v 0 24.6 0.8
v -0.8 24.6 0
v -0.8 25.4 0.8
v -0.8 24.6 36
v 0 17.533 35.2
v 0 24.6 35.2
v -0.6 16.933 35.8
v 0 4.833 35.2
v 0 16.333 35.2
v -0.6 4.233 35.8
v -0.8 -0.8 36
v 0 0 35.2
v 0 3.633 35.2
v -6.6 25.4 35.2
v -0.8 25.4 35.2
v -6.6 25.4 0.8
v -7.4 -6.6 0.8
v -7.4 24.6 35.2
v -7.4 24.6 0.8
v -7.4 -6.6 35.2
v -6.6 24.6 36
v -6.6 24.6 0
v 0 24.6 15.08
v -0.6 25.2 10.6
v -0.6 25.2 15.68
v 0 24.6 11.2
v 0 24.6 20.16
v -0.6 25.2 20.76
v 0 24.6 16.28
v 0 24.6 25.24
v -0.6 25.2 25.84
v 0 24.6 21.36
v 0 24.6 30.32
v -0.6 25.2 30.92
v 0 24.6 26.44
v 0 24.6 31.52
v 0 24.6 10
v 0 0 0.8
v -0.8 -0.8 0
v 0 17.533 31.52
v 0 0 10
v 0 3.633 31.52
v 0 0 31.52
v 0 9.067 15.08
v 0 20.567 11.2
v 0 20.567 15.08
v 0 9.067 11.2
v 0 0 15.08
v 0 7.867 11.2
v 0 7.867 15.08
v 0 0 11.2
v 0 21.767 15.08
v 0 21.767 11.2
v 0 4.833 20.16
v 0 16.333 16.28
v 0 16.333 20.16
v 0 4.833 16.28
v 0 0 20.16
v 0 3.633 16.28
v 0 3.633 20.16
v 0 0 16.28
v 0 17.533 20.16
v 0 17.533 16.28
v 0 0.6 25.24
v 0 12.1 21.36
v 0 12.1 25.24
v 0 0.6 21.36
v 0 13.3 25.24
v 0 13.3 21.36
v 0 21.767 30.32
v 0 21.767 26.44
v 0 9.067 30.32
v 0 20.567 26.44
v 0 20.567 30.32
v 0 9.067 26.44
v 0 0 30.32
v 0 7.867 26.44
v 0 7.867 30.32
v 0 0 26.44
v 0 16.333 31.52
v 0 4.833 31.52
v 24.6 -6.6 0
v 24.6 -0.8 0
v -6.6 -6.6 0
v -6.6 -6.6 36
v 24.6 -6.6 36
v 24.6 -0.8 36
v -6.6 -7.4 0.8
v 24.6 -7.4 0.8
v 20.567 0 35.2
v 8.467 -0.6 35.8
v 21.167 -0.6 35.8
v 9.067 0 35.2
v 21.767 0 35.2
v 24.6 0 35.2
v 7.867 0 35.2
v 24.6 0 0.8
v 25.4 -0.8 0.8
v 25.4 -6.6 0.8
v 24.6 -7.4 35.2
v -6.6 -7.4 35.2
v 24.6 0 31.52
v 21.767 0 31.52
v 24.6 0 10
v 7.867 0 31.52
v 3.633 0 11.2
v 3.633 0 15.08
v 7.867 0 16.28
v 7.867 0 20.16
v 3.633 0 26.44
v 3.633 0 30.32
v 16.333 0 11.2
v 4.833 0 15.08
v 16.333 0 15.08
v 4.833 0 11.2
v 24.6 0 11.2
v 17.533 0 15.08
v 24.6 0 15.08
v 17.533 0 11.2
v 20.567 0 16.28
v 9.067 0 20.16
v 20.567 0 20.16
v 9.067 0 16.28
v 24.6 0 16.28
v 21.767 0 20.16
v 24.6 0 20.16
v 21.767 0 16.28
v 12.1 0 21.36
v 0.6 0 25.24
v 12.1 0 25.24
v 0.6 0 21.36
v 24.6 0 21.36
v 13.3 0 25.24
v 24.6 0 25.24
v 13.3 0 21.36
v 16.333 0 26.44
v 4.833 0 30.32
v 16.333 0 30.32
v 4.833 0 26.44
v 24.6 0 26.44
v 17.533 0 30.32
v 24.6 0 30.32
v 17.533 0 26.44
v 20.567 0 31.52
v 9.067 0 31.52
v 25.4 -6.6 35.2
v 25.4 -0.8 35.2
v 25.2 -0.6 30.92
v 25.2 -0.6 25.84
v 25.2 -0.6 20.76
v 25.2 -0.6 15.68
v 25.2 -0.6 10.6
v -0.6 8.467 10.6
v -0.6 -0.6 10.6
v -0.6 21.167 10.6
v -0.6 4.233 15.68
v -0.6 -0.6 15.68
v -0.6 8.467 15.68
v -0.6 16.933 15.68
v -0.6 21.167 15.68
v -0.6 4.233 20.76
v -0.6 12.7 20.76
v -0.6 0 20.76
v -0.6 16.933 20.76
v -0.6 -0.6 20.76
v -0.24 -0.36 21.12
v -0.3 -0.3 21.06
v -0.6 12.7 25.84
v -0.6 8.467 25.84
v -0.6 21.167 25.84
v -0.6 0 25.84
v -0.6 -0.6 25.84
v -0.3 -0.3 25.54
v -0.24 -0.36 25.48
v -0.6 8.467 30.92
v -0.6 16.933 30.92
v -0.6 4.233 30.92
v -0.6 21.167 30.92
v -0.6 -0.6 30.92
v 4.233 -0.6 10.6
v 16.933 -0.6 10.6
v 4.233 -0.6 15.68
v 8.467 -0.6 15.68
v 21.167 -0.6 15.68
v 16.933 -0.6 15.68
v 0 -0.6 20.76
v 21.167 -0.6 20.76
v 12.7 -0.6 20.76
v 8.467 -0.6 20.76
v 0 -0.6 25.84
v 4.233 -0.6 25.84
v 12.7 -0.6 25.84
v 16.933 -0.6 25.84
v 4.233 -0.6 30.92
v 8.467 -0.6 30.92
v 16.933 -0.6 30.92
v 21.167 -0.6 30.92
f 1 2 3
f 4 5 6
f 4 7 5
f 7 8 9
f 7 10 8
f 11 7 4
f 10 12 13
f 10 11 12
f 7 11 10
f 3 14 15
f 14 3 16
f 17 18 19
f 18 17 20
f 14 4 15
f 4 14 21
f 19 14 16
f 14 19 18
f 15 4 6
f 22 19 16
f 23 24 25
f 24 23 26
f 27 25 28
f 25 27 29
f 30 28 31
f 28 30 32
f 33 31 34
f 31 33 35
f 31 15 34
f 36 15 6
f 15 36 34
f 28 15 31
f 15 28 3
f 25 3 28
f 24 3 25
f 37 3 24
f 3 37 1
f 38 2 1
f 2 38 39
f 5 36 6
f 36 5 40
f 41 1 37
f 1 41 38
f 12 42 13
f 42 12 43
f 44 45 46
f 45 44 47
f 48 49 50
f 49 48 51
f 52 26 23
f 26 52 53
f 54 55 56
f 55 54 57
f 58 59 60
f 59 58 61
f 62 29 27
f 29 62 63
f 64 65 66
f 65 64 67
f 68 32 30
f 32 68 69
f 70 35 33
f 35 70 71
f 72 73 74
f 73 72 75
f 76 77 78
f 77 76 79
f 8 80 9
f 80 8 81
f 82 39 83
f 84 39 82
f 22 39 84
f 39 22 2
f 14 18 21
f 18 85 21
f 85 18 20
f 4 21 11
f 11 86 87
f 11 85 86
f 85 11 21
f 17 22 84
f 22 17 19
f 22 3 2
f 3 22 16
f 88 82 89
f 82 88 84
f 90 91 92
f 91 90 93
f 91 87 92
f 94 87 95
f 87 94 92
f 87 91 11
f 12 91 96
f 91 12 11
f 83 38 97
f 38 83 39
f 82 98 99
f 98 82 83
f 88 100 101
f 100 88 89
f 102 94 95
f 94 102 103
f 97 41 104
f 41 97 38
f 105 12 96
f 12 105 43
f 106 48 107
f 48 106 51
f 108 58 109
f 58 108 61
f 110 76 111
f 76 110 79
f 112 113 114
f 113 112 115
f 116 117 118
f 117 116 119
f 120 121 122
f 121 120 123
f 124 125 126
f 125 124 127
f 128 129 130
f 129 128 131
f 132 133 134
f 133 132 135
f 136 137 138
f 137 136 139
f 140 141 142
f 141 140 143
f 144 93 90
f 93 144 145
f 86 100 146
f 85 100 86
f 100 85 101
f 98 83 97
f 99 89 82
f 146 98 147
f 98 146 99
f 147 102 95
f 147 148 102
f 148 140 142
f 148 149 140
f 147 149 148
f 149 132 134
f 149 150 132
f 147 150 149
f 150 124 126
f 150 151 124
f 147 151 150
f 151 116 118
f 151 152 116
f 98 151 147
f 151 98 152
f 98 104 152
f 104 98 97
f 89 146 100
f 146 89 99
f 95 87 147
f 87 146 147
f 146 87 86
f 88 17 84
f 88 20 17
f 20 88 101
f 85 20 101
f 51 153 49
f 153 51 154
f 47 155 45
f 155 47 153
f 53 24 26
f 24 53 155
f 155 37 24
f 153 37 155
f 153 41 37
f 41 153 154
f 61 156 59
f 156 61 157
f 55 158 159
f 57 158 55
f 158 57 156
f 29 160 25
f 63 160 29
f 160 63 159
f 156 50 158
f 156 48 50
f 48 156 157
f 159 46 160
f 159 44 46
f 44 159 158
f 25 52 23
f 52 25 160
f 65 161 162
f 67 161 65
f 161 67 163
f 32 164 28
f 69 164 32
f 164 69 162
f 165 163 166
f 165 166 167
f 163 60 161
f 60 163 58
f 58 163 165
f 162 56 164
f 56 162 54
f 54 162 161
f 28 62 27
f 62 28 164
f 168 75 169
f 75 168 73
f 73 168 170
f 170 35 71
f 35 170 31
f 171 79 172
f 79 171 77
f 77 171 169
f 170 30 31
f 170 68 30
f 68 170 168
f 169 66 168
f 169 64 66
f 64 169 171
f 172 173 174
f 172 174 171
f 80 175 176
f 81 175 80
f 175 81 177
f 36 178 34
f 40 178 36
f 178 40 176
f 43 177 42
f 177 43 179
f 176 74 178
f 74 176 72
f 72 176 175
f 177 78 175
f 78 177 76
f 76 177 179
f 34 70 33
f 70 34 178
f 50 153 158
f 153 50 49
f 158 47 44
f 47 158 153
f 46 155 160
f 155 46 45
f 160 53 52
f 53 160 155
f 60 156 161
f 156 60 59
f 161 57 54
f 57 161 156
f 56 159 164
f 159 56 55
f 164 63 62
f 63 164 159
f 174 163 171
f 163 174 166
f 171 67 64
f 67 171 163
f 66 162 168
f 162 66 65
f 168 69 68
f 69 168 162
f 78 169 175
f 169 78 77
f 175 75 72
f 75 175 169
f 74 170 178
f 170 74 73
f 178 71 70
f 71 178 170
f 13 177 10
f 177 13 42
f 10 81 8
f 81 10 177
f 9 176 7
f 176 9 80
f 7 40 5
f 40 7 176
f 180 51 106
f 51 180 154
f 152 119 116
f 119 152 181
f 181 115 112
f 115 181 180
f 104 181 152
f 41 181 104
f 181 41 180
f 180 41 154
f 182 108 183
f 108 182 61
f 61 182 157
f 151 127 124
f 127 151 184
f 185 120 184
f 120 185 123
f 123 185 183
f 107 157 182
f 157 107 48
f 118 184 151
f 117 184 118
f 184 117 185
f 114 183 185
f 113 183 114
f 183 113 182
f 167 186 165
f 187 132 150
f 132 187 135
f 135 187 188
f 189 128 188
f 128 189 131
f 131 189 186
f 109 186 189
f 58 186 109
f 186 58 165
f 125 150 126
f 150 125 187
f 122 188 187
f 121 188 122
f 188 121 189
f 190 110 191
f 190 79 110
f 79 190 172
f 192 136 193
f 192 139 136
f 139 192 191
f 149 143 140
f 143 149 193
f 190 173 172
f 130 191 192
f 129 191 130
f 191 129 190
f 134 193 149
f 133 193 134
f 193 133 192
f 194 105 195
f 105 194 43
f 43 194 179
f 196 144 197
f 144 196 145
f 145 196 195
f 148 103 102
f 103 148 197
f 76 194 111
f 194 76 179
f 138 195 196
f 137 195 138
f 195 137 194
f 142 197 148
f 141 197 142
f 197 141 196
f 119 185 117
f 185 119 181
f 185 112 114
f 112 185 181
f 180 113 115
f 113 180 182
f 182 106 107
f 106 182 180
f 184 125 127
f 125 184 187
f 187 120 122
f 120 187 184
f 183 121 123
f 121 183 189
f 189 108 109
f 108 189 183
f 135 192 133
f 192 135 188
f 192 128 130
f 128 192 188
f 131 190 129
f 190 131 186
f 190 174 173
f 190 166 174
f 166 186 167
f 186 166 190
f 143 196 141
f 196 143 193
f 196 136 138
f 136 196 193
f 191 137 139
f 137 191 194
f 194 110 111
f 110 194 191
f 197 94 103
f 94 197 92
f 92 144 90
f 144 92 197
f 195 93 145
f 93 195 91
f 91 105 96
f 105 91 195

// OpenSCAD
// file: wall_01_solid.scad
include <libs.scad>;

//wall
*linear_wall(4);
*round_wall(2);
corner_wall(1);

module linear_wall_base(size)
{
    translate([-wall_width/2,size*basis/2,wall_height/2])hull()
    {
        cube([wall_width-bevel*2,size*basis,wall_height-bevel*2],center=true);
        cube([wall_width-bevel*2,size*basis-bevel*2,wall_height],center=true);
        cube([wall_width,size*basis-bevel*2,wall_height-bevel*2],center=true);
    }
}

module round_wall_base(size)
{
    difference()
    {
        hull()
        {
            translate([0,0,bevel])cylinder(r=size*basis+wall_width,h=wall_height-bevel*2);
            cylinder(r=size*basis+wall_width-bevel,h=wall_height);
        }
        cylinder(r=size*basis,h=wall_height);
        translate([0,0,-ep])cylinder(r1=size*basis+bevel,r2=size*basis,h=bevel);
        translate([0,0,wall_height-bevel+ep])cylinder(r2=size*basis+bevel,r1=size*basis,h=bevel);
    }
}

module linear_brick_grids(size)
{
    //one for each wall level, horizontal
    brick_h=(wall_height-floor_thick)/wall_layers;
    for (ii=[0:wall_layers-1])
    {
        translate([0,size*basis/2,floor_thick+ii*brick_h])rotate([0,45,0])cube([wall_groove*sqrt(2),size*basis*2,wall_groove*sqrt(2)],center=true);
    }
    //vertical
    //one above floor is off by half, then even, then off
    for (ii=[1:1:wall_layers])
    {
        for(jj=[0:.5:size+1])
        {
            translate([0,jj*basis-(ii%6)*basis/6,floor_thick+ii*brick_h-brick_h/2])rotate([0,0,45])cube([wall_groove*sqrt(2),wall_groove*sqrt(2),brick_h],center=true);
        }
    }
}

module round_brick_grids(size)
{
    brick_h=(wall_height-floor_thick)/wall_layers;
    //horizontal
    for (ii=[0:wall_layers-1])
    {
        translate([0,0,floor_thick+ii*brick_h])hull()
        {
            cylinder(r=basis*size+wall_groove,h=ep,center=true);
            cylinder(r=basis*size,h=wall_groove*2,center=true);
        }
    }
    //vertical
    //vertical should be shifted each layer
    for (ii=[1:1:wall_layers])
    {
        for(jj=[0:30/size:120])
        {
            rotate([0,0,jj+(ii%6)*(10/size)])translate([basis*size,0,floor_thick+ii*brick_h-brick_h/2])rotate([0,0,45])cube([wall_groove*sqrt(2),wall_groove*sqrt(2),brick_h],center=true);
        }
    }
}

module round_wall(size)
{
    xx=basis*size+wall_width;
    yy=basis*size+wall_width;
    zz=wall_height;
    difference()
    {
        intersection()
        {
            round_wall_base(size);
            translate([.5*(basis*size+wall_width),.5*(basis*size+wall_width),wall_height/2])hull()
            {
                cube([xx-bevel*2,yy,zz-bevel*2],center=true);
                cube([xx-bevel*2,yy-bevel*2,zz],center=true);
                cube([xx,yy-bevel*2,zz-bevel*2],center=true);
            }
        }
        hull()
        {
            cube([basis*size*2+bevel*2,ep,zz*3],center=true);
            cube([ep,basis*size*2+bevel*2,zz*3],center=true);
        }
        round_brick_grids(size);
    }
}

module linear_wall(size)
{
    difference()
    {
        linear_wall_base(size);
        linear_brick_grids(size);
        *translate([-wall_width,0,0])linear_brick_grids(size);
    }
}

module corner_wall(size)
{
  intersection()
  {
    linear_wall(size);
    //45 degree slope so we can do inside corners
    translate([0,0,0])hull()
    {
      //beveling
      translate([0,0,-ep])linear_extrude(wall_height+ep*2)offset(delta=-bevel)hull()
      {
        translate([0,basis*0.5*size])square([ep,basis*size-wall_tol*2],center=true);
        translate([-wall_width,basis*0.5*size])square([ep,basis*size-wall_tol*2-wall_width*2],center=true);
      }
      translate([0,0,bevel])linear_extrude(wall_height-bevel*2)hull()
      {
        translate([0,basis*0.5*size])square([ep,basis*size-wall_tol*2],center=true);
        translate([-wall_width,basis*0.5*size])square([ep,basis*size-wall_tol*2-wall_width*2],center=true);
      }
    }
  }
}
// main file
include <libs.scad>;
use <wall_01_solid.scad>;

convex_linear();
//concave_linear();
module convex_linear()
{
  difference()
  {
    intersection()
    {
      //two sides meeting
      union()
      {
        translate([0,-basis,0])linear_wall_base(2);
        rotate([0,0,90])translate([0,-basis,0])linear_wall_base(2);
      }
      //cut down the part that sticks out the back
      translate([basis-wall_width,basis-wall_width,wall_height/2])hull()
      {
        cube([2*basis-bevel*2,2*basis-bevel*2,wall_height],center=true);
        cube([2*basis-bevel*2,2*basis,wall_height-bevel*2],center=true);
        cube([2*basis,2*basis-bevel*2,wall_height-bevel*2],center=true);
      }
    }
    
    
      intersection()
      {
        linear_brick_grids(1);
        translate([-wall_groove,0,0])cube([2*basis,2*basis,wall_height]);
        
      }
      intersection()
      {
        rotate([0,0,90])translate([0,-basis,0])linear_brick_grids(1);
        translate([0,-wall_groove,0])cube([2*basis,2*basis,wall_height]);
      }
      intersection()
      {
        linear_brick_grids(1);
        rotate([0,0,90])translate([0,-basis,0])linear_brick_grids(1);
      }
    
  }
}

module concave_linear()
{
  difference()
  {
    //two sides meeting
    union()
    {
      translate([0,0,0])linear_wall_base(1);
      rotate([0,0,-90])translate([0,-basis,0])linear_wall_base(1);
    }
    //apply brick pattern
    linear_brick_grids(1);
    rotate([0,0,-90])translate([0,-basis,0])linear_brick_grids(1);
  }
}
